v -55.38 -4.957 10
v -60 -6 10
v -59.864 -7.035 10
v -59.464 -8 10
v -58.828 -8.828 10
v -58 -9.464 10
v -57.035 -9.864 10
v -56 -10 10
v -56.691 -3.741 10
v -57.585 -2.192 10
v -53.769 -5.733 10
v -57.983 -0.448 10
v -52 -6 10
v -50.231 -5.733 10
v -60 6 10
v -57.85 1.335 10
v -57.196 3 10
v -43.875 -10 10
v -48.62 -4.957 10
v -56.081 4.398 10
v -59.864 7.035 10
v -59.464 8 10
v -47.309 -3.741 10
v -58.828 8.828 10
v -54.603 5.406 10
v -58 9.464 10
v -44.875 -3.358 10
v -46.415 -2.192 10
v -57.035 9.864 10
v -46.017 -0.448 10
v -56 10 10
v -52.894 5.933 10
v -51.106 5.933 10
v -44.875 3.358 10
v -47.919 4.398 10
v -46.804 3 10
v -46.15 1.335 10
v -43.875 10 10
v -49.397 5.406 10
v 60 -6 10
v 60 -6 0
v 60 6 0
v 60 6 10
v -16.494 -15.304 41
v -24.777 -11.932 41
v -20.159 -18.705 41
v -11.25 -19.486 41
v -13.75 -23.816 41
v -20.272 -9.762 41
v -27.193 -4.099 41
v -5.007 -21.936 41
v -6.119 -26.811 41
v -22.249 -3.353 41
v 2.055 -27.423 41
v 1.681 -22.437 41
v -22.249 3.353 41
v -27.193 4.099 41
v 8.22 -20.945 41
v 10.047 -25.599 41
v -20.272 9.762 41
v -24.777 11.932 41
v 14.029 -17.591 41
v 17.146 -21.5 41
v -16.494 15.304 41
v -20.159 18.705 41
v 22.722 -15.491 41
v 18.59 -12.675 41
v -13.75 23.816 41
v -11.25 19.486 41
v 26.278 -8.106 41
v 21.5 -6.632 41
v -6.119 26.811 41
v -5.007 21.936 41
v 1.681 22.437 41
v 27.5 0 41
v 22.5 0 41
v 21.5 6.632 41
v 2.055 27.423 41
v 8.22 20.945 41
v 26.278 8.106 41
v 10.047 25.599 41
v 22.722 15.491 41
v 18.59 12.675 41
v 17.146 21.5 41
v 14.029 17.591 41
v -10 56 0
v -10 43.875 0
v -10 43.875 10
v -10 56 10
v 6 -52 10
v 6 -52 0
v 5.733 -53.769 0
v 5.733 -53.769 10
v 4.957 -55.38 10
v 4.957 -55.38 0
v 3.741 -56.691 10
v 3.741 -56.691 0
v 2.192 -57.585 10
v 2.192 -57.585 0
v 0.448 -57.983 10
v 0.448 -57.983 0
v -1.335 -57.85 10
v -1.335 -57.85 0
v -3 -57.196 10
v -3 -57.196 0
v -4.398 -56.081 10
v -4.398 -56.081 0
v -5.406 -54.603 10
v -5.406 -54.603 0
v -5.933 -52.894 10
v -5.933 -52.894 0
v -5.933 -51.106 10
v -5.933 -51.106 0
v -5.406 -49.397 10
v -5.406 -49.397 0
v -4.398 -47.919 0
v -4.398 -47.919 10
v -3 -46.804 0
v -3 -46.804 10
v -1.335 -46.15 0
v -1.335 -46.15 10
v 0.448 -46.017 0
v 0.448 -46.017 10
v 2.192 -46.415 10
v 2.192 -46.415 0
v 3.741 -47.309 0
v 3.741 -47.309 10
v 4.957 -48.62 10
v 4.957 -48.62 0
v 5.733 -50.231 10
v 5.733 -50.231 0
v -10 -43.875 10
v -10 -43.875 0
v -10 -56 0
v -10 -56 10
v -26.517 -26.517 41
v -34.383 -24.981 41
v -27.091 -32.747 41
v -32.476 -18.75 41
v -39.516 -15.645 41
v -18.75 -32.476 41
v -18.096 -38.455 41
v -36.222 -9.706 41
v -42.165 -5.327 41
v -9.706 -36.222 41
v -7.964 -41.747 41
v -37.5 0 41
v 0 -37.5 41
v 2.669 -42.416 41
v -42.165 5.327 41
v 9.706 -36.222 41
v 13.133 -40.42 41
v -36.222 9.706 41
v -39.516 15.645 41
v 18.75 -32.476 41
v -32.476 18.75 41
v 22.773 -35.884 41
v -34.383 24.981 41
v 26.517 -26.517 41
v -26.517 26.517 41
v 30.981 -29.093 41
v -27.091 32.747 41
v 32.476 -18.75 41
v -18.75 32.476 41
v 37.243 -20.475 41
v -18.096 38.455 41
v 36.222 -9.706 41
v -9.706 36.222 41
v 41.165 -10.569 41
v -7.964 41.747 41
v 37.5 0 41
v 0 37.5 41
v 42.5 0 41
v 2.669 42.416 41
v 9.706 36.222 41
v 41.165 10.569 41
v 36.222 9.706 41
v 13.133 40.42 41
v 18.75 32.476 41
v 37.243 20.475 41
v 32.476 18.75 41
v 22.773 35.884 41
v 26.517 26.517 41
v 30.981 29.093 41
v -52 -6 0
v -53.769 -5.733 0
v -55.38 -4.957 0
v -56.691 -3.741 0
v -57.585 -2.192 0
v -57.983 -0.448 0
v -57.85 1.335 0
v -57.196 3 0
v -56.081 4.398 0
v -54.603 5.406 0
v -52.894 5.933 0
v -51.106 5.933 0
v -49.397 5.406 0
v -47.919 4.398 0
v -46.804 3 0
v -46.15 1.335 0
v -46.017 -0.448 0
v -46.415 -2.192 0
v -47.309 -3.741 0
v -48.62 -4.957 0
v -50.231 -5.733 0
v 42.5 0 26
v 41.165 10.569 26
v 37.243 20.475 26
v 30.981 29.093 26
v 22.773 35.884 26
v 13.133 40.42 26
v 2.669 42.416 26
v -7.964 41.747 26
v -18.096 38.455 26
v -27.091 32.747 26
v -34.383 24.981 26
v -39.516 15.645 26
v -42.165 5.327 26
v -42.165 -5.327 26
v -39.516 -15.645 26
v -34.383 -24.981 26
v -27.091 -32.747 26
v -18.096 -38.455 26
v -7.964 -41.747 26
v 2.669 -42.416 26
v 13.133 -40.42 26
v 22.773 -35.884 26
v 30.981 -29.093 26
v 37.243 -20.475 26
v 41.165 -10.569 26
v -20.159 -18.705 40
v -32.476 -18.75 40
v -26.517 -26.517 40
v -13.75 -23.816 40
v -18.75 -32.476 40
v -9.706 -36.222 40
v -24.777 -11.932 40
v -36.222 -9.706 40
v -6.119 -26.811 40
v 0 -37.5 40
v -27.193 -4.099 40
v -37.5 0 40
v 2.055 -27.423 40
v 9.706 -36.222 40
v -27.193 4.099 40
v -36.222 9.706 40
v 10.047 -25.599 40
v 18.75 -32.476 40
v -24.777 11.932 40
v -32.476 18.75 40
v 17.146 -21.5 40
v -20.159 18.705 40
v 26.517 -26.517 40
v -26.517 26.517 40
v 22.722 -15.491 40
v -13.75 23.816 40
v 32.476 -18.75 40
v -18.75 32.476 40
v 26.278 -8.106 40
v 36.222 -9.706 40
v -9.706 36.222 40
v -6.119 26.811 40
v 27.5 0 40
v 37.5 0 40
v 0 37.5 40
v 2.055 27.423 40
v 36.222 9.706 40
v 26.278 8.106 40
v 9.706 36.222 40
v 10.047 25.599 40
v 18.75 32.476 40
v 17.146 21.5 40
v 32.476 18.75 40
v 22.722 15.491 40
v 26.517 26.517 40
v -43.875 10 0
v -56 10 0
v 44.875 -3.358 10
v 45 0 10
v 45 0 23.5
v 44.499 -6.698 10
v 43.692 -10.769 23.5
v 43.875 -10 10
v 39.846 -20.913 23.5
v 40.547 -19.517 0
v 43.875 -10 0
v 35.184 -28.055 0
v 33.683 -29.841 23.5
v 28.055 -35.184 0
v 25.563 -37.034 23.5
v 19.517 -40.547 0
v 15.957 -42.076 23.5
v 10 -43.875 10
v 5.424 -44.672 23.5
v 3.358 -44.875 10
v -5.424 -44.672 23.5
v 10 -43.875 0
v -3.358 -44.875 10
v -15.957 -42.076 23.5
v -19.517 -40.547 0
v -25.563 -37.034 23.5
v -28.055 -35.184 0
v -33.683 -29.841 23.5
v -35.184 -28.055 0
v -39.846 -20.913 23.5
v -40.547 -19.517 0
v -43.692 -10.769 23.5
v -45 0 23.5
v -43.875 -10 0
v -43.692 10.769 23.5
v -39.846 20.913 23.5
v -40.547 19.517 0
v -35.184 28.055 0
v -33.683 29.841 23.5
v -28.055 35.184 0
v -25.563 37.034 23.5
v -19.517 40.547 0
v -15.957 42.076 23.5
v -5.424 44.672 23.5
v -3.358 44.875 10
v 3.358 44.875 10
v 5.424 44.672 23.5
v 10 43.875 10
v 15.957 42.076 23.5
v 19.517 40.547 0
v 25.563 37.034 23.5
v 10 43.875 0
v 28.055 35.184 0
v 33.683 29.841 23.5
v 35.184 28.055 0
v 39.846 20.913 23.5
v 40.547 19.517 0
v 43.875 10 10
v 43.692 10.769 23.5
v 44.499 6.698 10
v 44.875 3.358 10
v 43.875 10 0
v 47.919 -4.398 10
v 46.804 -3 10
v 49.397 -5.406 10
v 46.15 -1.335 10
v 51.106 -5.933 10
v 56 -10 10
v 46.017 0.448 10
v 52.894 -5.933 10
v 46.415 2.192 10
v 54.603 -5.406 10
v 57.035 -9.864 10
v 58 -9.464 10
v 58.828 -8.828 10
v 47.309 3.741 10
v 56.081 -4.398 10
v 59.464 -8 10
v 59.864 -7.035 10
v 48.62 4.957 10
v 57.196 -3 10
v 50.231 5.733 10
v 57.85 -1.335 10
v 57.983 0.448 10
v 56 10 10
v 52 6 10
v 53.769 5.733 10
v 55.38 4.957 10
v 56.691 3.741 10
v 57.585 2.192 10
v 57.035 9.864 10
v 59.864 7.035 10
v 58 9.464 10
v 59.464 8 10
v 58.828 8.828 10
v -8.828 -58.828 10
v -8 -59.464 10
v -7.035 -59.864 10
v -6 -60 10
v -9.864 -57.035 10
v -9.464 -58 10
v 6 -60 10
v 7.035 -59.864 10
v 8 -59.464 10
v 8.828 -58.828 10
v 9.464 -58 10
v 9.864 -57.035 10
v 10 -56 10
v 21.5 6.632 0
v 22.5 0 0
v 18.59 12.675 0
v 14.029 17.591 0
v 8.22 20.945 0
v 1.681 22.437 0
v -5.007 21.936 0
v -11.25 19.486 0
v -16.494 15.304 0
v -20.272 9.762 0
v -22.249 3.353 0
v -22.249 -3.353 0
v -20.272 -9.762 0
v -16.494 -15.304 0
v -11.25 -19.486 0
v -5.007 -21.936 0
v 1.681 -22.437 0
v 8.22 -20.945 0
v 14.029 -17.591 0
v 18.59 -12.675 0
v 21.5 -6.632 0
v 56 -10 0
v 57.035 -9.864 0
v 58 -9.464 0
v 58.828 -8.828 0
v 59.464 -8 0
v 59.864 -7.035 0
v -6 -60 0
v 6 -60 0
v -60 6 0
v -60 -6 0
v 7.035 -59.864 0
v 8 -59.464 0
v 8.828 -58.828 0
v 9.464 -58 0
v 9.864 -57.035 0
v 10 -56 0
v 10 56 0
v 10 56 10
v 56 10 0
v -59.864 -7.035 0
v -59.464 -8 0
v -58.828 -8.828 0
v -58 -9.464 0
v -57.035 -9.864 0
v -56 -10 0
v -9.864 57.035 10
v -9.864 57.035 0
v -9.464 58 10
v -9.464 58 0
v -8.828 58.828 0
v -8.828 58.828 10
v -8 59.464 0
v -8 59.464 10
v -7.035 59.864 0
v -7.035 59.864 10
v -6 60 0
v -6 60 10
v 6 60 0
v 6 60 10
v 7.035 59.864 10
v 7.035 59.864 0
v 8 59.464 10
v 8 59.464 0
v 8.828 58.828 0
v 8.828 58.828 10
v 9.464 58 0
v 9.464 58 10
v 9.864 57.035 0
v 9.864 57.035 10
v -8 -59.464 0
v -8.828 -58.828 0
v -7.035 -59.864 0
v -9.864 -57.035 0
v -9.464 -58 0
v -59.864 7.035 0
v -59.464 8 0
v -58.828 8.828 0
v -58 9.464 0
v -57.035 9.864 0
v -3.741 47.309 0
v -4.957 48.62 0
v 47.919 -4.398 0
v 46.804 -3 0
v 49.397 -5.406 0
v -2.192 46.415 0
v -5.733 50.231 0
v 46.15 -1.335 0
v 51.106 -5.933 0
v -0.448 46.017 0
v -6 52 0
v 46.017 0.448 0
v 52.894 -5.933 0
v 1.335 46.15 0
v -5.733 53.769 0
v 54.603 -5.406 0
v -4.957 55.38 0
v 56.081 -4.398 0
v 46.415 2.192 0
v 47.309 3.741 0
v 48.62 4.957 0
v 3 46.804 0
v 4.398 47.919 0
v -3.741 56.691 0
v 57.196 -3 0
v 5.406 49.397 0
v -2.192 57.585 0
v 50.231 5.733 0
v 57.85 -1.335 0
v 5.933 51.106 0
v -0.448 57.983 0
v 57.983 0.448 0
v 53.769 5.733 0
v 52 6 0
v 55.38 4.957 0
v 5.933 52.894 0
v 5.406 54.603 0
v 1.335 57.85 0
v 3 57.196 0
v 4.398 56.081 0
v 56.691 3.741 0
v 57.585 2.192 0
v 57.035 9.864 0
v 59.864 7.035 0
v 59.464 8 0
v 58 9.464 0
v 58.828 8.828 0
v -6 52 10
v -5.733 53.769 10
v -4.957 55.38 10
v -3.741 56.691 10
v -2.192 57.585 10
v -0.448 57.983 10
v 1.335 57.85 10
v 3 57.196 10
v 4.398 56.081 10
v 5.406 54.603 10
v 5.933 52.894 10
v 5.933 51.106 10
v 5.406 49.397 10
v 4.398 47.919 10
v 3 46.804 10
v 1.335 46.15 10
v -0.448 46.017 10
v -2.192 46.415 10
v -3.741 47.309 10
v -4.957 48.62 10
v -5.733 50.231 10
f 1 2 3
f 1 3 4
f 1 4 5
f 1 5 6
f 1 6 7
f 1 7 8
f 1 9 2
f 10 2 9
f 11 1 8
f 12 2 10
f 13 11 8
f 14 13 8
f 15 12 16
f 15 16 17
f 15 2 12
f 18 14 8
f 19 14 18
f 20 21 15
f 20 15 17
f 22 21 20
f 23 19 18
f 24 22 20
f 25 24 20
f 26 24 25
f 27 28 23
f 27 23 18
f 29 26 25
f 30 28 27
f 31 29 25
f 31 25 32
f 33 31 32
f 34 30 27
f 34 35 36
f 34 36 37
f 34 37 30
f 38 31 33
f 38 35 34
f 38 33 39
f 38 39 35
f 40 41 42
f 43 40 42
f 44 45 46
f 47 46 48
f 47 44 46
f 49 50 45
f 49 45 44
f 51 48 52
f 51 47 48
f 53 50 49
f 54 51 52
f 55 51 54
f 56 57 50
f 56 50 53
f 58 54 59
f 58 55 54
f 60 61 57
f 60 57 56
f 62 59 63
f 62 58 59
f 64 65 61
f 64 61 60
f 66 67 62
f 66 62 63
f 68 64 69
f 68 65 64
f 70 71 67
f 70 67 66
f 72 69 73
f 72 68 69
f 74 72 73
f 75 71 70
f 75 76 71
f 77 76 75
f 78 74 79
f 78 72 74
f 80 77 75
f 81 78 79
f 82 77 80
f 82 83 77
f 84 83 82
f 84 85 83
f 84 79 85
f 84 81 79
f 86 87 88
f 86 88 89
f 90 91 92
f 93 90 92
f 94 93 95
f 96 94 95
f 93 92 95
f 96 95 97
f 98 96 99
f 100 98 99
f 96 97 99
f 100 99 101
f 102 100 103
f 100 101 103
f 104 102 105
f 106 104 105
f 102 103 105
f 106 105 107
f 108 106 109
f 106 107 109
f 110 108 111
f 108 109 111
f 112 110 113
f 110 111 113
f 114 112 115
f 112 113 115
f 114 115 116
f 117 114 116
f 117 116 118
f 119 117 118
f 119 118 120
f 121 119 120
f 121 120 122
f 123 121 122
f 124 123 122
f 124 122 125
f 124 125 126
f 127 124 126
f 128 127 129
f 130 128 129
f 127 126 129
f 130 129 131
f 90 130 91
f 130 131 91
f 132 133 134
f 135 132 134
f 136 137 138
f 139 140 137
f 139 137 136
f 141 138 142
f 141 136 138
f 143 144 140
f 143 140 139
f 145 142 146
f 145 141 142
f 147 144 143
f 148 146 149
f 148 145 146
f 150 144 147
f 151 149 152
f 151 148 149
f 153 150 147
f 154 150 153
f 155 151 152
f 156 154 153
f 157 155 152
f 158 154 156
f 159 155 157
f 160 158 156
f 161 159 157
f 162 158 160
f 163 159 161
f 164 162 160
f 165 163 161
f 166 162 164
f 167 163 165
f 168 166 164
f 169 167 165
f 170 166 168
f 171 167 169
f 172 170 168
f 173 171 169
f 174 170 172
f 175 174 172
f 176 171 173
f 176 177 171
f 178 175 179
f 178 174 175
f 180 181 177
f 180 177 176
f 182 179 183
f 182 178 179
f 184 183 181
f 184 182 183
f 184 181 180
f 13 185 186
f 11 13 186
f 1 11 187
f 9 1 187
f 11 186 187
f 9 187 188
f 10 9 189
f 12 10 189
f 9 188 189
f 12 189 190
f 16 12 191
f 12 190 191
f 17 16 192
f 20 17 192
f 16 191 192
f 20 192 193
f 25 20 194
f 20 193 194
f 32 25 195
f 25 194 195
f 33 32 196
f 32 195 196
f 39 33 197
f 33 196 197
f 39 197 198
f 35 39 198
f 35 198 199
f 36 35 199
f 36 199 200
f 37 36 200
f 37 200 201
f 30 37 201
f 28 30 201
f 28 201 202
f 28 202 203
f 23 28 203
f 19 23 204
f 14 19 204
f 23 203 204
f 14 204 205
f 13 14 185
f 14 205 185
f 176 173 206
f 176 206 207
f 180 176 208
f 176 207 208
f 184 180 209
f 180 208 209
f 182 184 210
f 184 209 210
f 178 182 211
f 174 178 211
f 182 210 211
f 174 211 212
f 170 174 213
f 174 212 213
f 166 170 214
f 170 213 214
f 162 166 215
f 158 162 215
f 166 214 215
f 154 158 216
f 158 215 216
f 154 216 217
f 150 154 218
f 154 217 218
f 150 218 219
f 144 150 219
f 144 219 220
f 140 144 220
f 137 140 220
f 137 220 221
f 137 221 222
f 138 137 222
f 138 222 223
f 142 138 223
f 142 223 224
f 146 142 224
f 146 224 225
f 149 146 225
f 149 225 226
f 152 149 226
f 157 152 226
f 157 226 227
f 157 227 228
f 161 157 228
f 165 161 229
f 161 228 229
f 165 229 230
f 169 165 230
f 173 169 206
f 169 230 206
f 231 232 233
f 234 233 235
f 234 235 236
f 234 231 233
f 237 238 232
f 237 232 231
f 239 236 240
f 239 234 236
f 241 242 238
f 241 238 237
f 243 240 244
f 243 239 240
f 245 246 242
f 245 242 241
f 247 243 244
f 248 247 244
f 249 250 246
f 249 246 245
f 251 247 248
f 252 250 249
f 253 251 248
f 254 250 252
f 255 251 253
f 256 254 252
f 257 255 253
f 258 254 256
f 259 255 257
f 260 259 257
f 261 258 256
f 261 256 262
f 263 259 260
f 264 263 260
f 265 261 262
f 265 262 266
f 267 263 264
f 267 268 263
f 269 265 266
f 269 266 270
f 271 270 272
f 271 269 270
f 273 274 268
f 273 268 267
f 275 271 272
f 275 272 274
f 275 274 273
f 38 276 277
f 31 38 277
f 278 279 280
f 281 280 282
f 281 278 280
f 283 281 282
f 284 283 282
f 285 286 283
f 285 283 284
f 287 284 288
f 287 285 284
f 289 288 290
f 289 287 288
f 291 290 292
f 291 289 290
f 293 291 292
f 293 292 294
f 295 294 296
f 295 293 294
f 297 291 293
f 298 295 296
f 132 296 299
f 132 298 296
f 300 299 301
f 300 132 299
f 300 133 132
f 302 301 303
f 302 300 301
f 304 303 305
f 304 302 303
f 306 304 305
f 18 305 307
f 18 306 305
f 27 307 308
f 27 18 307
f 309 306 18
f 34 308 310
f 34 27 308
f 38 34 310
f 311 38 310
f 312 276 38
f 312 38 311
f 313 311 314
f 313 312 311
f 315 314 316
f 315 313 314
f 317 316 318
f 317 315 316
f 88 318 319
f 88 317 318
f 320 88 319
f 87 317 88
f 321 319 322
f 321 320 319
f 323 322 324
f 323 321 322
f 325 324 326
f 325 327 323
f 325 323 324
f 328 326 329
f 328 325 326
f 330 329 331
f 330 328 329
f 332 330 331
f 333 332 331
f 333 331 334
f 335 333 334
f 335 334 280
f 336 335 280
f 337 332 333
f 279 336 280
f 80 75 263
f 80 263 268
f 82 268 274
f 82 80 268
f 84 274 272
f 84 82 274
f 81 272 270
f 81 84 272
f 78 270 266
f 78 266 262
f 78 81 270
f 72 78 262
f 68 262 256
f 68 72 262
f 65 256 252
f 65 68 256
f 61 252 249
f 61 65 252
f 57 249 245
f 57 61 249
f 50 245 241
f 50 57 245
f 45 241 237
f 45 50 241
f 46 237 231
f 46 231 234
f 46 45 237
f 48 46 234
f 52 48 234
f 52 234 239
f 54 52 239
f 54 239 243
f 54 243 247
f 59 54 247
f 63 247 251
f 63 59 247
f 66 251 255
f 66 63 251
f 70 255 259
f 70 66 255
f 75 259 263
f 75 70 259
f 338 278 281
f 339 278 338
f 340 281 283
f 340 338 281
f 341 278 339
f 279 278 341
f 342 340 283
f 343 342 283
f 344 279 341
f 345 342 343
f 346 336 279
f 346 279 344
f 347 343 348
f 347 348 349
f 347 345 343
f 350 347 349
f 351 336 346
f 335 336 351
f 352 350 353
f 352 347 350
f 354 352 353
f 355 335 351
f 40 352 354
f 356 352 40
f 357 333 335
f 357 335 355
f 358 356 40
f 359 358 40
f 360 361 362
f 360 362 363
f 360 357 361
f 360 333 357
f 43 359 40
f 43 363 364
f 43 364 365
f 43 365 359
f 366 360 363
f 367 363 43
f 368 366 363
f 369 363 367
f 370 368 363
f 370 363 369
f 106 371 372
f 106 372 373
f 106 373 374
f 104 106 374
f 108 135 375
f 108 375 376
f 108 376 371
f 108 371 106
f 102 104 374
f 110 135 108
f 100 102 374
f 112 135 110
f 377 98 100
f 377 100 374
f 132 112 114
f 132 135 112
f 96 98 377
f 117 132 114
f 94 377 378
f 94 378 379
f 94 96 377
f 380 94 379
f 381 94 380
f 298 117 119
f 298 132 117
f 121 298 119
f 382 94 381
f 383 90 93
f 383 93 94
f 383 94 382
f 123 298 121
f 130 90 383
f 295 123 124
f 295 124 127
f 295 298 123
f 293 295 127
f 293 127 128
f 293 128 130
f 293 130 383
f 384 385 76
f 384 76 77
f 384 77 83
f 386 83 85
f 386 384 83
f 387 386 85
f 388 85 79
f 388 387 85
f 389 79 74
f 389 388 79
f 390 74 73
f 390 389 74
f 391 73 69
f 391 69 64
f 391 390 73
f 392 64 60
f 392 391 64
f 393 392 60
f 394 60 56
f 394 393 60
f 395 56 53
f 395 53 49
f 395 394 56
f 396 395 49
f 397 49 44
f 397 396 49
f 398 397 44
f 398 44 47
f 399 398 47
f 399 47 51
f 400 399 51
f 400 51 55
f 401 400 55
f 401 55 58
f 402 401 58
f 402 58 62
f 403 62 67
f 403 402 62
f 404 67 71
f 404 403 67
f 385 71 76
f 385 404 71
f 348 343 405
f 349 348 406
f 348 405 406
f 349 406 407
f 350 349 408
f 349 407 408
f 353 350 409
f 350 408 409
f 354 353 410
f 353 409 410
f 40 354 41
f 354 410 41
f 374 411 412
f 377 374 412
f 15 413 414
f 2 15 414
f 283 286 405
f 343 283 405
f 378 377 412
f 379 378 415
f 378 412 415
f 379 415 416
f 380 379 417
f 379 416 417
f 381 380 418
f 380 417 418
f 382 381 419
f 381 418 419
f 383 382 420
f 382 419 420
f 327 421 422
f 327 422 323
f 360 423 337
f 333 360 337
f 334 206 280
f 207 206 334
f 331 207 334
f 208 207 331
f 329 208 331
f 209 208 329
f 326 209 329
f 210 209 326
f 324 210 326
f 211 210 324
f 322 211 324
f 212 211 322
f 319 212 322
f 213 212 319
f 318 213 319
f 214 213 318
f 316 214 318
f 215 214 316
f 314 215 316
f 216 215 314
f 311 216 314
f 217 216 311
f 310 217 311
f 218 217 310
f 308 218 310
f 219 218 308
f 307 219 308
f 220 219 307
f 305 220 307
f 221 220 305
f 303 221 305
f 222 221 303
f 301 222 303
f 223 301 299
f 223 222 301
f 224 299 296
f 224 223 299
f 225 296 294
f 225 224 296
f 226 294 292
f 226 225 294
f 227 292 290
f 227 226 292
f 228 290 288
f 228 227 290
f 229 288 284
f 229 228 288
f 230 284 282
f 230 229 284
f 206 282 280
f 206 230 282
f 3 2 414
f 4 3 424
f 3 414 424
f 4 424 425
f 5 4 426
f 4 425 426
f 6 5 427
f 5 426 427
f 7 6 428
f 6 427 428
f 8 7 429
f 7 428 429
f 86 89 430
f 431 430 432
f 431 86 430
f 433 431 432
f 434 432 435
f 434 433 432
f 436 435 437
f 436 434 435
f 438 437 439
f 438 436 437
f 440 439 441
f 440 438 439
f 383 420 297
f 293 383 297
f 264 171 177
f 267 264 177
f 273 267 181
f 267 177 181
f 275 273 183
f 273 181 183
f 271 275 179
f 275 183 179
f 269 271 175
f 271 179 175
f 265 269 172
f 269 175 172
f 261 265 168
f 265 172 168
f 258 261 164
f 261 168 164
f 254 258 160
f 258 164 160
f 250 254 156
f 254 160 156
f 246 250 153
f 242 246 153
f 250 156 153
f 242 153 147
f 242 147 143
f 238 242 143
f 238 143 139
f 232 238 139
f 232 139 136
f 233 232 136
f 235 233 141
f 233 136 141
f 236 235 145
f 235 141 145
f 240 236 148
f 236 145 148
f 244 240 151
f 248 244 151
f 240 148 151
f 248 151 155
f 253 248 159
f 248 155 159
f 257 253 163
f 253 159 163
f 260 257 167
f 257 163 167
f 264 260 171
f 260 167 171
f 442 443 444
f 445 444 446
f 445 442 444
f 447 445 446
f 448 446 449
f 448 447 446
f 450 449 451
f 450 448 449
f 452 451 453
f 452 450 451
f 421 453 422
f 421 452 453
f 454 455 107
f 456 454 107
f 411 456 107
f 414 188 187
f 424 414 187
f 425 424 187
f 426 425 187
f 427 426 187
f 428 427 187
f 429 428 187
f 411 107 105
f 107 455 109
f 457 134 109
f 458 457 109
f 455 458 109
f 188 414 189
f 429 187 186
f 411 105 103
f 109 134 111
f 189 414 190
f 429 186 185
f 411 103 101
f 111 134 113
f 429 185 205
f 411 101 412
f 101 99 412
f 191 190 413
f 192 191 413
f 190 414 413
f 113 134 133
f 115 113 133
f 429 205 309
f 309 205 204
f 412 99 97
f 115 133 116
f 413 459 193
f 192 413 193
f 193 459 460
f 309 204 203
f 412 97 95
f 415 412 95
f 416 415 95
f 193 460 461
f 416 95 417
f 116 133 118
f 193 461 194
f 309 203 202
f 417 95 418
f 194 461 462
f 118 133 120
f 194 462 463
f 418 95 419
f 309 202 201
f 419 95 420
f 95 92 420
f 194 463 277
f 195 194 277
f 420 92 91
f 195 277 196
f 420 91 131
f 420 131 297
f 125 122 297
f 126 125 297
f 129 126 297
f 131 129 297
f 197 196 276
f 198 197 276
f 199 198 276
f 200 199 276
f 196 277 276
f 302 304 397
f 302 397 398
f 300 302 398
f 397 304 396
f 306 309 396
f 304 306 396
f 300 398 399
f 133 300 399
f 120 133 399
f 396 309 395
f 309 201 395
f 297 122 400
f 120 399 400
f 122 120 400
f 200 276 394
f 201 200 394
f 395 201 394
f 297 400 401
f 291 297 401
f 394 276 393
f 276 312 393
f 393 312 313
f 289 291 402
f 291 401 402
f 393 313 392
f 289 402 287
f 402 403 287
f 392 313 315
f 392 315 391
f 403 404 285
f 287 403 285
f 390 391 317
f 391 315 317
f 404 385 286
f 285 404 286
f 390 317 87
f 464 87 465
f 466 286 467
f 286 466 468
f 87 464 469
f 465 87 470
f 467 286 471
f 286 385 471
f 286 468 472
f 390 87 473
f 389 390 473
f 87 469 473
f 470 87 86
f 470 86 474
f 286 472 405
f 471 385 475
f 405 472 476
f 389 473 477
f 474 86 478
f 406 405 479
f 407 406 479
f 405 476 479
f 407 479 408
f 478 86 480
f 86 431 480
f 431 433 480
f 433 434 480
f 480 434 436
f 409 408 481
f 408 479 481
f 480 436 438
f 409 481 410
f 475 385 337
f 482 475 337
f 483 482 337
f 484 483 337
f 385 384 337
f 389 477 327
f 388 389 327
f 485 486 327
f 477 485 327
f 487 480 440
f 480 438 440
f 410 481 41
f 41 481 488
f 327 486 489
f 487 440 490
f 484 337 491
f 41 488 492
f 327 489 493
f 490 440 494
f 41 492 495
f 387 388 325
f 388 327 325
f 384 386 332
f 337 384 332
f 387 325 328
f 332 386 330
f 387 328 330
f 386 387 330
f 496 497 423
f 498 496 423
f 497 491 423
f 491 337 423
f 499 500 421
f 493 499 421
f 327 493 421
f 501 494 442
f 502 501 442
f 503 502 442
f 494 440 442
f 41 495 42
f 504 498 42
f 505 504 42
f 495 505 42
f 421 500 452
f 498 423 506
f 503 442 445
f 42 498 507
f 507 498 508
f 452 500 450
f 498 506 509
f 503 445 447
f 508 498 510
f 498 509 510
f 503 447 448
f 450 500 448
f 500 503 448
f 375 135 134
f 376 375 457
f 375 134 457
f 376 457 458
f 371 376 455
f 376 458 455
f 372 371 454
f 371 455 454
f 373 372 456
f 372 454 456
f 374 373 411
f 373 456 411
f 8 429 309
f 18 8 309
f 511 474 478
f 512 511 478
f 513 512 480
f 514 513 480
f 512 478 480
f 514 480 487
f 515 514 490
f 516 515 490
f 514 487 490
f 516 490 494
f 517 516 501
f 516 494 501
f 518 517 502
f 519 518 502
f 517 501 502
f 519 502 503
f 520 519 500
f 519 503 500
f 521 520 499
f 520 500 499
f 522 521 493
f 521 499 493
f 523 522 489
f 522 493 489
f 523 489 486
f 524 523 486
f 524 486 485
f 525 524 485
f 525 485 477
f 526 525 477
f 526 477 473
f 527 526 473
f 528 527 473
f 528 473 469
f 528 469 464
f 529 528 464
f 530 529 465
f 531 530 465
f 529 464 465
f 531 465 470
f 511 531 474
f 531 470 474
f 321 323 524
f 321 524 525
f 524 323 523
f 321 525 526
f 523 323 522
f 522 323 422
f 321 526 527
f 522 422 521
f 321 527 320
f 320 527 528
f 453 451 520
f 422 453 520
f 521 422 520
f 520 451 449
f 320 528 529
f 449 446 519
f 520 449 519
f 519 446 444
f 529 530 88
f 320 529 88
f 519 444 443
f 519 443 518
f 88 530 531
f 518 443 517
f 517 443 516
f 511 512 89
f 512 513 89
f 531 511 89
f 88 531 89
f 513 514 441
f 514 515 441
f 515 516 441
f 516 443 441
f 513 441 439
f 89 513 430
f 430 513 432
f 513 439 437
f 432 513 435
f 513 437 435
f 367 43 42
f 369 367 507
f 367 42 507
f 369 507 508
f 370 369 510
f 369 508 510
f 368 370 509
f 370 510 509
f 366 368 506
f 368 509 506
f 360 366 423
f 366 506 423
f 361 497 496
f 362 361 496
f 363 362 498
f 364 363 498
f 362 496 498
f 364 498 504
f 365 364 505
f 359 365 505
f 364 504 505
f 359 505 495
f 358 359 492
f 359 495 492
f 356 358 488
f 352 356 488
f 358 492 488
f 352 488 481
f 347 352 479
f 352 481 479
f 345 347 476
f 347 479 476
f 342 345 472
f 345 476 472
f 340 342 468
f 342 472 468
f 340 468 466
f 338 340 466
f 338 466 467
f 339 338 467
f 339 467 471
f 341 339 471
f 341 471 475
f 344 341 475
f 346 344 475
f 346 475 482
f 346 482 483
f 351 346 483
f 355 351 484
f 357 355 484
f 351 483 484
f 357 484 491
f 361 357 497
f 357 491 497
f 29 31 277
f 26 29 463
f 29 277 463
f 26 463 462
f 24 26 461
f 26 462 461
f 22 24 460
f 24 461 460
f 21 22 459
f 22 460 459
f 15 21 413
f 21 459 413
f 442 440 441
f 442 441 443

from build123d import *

# Parameters (mm, degrees)
SZKIC1_R                    = 45
SZKIC1_R_2                  = 22.5
DODANIE_WYCI_GNI_CIE1_DEPTH = 41
DODANIE_WYCI_GNI_CIE2_DEPTH = 10
SZKIC3_R                    = 6
WYTNIJ_WYCI_GNI_CIE1_DEPTH  = 10
SZYK_KO_OWY1_COUNT          = 4
WYTNIJ_WYCI_GNI_CIE2_START  = -20
SZKIC5_R                    = 45
SZKIC5_R_2                  = 42.5
WYTNIJ_WYCI_GNI_CIE2_DEPTH  = 20
SZKIC6_R                    = 37.5
SZKIC6_R_2                  = 27.5
WYTNIJ_WYCI_GNI_CIE3_DEPTH  = 1
SFAZOWANIE1_SIZE            = 5


with BuildPart() as part:
    # Szkic1 → Dodanie-wyciągnięcie1 (new body)
    with BuildSketch(Plane.XY):
        Circle(SZKIC1_R)
        Circle(SZKIC1_R_2, mode=Mode.SUBTRACT)
    extrude(amount=DODANIE_WYCI_GNI_CIE1_DEPTH)

    # Szkic2 → Dodanie-wyciągnięcie2 (add)
    with BuildSketch(Plane(origin=(0, 0, 0), x_dir=(-1, 0, 0), z_dir=(0, 0, -1))):
        with BuildLine():
            Line((35, 10), (56, 10))
            ThreePointArc((56, 10), (58.828427125, 8.828427125), (60, 6))
            Line((60, 6), (60, -6))
            ThreePointArc((60, -6), (58.828427125, -8.828427125), (56, -10))
            Line((56, -10), (35, -10))
            Line((35, -10), (35, 10))
        make_face()
        with BuildLine():
            Line((-10, 35), (10, 35))
            Line((10, 35), (10, 56))
            ThreePointArc((10, 56), (8.828427125, 58.828427125), (6, 60))
            Line((6, 60), (-6, 60))
            ThreePointArc((-6, 60), (-8.828427125, 58.828427125), (-10, 56))
            Line((-10, 56), (-10, 35))
        make_face()
        with BuildLine():
            Line((10, -35), (10, -56))
            ThreePointArc((10, -56), (8.828427125, -58.828427125), (6, -60))
            Line((6, -60), (-6, -60))
            ThreePointArc((-6, -60), (-8.828427125, -58.828427125), (-10, -56))
            Line((-10, -56), (-10, -35))
            Line((-10, -35), (10, -35))
        make_face()
        with BuildLine():
            Line((-35, -10), (-56, -10))
            ThreePointArc((-56, -10), (-58.828427125, -8.828427125), (-60, -6))
            Line((-60, -6), (-60, 6))
            ThreePointArc((-60, 6), (-58.828427125, 8.828427125), (-56, 10))
            Line((-56, 10), (-35, 10))
            Line((-35, 10), (-35, -10))
        make_face()
    extrude(amount=-DODANIE_WYCI_GNI_CIE2_DEPTH)

    # Szkic3 → Wytnij-wyciągnięcie1 (cut)
    with BuildSketch(Plane(origin=(0, 0, 0), x_dir=(-1, 0, 0), z_dir=(0, 0, -1))):
        with Locations((0, 52)):
            Circle(SZKIC3_R)
    wytnij_wyci_gni_cie1 = extrude(amount=-WYTNIJ_WYCI_GNI_CIE1_DEPTH, mode=Mode.SUBTRACT)

    # Szyk kołowy1: Wytnij-wyciągnięcie1 ×4 about axis
    szyk_ko_owy1_axis = Axis((0, 0, 0), (0, 0, 1))
    for i in range(1, SZYK_KO_OWY1_COUNT):
        add(wytnij_wyci_gni_cie1.rotate(szyk_ko_owy1_axis, i * 360 / SZYK_KO_OWY1_COUNT), mode=Mode.SUBTRACT)

    # Szkic5 → Wytnij-wyciągnięcie2 (cut)
    with BuildSketch(Plane.XY.offset(41).offset(WYTNIJ_WYCI_GNI_CIE2_START)):
        with Locations(Location((0, 0, 0), (0, 0, 167.160411593))):
            Circle(SZKIC5_R)
        Circle(SZKIC5_R_2, mode=Mode.SUBTRACT)
    extrude(amount=WYTNIJ_WYCI_GNI_CIE2_DEPTH, mode=Mode.SUBTRACT)

    # Szkic6 → Wytnij-wyciągnięcie3 (cut)
    with BuildSketch(Plane.XY.offset(41)):
        Circle(SZKIC6_R)
        Circle(SZKIC6_R_2, mode=Mode.SUBTRACT)
    extrude(amount=-WYTNIJ_WYCI_GNI_CIE3_DEPTH, mode=Mode.SUBTRACT)

    # Sfazowanie1
    # the kernel refuses this chamfer: 5 mm, written as the material it adds along each edge
    with BuildSketch(Plane(origin=(0, 0, 21), x_dir=(1, 0, 0), z_dir=(0, -1, 0))) as sfazowanie1_piece_1_section:
        Polygon((42.5 + SFAZOWANIE1_SIZE, 0), (42.5, SFAZOWANIE1_SIZE), (42.5, 0), align=None)
    sfazowanie1_piece_1 = revolve(axis=Axis((0, 0, 21), (0, 0, 1)), mode=Mode.PRIVATE)
    sfazowanie1_piece_1 = sfazowanie1_piece_1 & Plane(origin=(0, 0, 24.721078182), x_dir=(1, 0, 0), z_dir=(0, 0, -1)) * Cylinder(45, 190, mode=Mode.PRIVATE)
    add(sfazowanie1_piece_1)


solid = part.part
